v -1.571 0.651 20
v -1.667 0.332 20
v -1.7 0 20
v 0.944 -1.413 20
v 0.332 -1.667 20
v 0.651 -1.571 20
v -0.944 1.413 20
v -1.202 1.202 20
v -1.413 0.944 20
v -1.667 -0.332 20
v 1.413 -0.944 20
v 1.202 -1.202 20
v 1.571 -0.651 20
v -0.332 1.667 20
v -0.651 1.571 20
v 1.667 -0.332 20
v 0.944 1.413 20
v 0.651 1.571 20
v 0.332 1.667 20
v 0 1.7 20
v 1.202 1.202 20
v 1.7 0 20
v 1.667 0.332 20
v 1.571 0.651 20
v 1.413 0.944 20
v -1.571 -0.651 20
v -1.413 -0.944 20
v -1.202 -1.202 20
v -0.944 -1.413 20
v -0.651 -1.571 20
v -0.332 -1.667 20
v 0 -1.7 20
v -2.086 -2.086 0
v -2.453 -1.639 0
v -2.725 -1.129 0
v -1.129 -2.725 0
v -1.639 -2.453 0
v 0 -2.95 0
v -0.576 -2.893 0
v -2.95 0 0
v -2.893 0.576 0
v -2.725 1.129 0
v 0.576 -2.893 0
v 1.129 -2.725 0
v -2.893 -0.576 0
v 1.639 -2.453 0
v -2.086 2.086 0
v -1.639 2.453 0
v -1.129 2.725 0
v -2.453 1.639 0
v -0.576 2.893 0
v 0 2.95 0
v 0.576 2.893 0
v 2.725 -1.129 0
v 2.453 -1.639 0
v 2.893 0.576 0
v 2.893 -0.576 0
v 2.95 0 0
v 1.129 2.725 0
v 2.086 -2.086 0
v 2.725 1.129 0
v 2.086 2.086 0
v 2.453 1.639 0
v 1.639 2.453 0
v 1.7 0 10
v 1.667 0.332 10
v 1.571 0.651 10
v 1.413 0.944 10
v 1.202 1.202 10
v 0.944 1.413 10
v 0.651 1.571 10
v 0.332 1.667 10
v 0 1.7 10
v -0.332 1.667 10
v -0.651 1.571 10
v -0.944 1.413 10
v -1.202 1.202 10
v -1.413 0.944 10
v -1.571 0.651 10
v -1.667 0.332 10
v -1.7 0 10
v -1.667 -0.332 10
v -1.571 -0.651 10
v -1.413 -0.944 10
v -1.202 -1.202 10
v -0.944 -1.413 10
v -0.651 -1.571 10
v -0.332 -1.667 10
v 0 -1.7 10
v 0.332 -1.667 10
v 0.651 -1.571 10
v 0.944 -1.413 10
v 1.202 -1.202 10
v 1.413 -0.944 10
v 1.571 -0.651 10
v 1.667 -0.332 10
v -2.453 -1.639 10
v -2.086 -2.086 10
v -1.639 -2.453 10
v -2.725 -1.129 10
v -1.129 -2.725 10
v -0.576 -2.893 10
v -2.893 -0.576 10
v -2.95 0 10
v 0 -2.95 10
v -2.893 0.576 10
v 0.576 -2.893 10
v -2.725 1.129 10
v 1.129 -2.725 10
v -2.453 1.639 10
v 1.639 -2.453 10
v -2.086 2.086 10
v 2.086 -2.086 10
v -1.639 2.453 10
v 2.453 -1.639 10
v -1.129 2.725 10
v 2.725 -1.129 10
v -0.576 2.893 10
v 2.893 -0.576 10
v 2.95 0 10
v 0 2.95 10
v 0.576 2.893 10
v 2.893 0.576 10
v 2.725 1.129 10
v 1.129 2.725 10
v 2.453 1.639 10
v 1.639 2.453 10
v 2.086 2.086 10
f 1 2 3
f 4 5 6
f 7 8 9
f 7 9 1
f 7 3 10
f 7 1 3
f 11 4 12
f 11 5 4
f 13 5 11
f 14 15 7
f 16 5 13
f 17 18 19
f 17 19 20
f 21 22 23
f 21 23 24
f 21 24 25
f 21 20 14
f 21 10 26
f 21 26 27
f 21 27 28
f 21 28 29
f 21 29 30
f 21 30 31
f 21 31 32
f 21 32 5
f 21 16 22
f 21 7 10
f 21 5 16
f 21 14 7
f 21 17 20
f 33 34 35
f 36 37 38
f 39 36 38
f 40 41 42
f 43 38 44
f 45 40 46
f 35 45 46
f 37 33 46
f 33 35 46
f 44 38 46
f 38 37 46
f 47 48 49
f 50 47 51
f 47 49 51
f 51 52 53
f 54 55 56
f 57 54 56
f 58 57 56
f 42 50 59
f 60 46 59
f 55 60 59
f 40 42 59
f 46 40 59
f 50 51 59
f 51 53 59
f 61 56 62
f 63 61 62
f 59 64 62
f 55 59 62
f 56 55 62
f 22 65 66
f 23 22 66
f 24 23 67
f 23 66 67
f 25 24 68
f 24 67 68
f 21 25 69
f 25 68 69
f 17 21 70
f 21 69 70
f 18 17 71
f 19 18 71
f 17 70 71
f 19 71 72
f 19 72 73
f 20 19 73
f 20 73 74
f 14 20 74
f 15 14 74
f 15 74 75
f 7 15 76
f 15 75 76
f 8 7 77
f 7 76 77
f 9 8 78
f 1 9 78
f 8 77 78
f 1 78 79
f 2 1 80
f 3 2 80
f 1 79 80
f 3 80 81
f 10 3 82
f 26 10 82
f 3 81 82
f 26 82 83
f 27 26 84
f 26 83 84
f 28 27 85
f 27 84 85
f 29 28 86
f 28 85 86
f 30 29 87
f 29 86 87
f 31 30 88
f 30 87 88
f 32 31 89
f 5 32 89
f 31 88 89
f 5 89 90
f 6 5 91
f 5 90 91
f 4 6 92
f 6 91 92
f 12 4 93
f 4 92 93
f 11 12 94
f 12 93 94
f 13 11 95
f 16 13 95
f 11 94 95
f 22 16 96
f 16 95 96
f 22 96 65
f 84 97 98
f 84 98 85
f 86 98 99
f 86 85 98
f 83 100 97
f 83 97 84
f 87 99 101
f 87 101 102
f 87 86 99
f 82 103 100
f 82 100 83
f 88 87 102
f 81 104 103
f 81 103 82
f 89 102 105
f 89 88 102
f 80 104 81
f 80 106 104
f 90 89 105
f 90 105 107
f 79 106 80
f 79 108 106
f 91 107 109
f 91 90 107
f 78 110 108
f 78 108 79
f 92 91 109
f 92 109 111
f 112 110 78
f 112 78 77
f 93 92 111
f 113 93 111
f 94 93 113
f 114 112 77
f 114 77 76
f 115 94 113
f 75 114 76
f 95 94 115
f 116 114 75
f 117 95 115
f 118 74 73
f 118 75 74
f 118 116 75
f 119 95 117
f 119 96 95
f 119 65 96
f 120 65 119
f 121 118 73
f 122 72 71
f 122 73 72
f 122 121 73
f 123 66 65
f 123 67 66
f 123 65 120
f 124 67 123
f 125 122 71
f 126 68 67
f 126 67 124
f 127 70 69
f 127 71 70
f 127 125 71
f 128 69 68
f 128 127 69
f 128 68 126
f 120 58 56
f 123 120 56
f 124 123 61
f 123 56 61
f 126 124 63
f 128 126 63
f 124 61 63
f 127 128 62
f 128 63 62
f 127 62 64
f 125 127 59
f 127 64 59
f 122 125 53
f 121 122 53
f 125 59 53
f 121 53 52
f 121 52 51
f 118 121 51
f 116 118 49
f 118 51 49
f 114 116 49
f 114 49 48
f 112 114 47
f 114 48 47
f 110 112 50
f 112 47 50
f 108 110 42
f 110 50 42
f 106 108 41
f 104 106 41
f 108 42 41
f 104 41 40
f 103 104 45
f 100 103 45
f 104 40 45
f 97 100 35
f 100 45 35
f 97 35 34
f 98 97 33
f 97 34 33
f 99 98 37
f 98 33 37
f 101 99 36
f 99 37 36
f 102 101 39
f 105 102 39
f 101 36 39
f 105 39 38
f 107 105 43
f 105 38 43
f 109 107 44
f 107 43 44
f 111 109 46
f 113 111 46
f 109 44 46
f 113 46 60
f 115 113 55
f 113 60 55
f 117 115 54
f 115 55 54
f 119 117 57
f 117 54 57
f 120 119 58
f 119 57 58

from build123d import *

# Parameters (mm, degrees)
CYLINDER1036_R     = 2.95
CYLINDER1036_DEPTH = 10
CYLINDER1037_R     = 1.7
CYLINDER1037_DEPTH = 10


with BuildPart() as cylinder1078:
    # Cylinder1036 → Cylinder1036 (new body)
    with BuildSketch(Plane.XY):
        Circle(CYLINDER1036_R)
    extrude(amount=CYLINDER1036_DEPTH)


with BuildPart() as m3boltshort:
    # Cylinder1037 → Cylinder1037 (new body)
    with BuildSketch(Plane.XY.offset(10)):
        Circle(CYLINDER1037_R)
    extrude(amount=CYLINDER1037_DEPTH)

    # Fusion114: union Cylinder1078
    add(cylinder1078.part)


solid = m3boltshort.part
